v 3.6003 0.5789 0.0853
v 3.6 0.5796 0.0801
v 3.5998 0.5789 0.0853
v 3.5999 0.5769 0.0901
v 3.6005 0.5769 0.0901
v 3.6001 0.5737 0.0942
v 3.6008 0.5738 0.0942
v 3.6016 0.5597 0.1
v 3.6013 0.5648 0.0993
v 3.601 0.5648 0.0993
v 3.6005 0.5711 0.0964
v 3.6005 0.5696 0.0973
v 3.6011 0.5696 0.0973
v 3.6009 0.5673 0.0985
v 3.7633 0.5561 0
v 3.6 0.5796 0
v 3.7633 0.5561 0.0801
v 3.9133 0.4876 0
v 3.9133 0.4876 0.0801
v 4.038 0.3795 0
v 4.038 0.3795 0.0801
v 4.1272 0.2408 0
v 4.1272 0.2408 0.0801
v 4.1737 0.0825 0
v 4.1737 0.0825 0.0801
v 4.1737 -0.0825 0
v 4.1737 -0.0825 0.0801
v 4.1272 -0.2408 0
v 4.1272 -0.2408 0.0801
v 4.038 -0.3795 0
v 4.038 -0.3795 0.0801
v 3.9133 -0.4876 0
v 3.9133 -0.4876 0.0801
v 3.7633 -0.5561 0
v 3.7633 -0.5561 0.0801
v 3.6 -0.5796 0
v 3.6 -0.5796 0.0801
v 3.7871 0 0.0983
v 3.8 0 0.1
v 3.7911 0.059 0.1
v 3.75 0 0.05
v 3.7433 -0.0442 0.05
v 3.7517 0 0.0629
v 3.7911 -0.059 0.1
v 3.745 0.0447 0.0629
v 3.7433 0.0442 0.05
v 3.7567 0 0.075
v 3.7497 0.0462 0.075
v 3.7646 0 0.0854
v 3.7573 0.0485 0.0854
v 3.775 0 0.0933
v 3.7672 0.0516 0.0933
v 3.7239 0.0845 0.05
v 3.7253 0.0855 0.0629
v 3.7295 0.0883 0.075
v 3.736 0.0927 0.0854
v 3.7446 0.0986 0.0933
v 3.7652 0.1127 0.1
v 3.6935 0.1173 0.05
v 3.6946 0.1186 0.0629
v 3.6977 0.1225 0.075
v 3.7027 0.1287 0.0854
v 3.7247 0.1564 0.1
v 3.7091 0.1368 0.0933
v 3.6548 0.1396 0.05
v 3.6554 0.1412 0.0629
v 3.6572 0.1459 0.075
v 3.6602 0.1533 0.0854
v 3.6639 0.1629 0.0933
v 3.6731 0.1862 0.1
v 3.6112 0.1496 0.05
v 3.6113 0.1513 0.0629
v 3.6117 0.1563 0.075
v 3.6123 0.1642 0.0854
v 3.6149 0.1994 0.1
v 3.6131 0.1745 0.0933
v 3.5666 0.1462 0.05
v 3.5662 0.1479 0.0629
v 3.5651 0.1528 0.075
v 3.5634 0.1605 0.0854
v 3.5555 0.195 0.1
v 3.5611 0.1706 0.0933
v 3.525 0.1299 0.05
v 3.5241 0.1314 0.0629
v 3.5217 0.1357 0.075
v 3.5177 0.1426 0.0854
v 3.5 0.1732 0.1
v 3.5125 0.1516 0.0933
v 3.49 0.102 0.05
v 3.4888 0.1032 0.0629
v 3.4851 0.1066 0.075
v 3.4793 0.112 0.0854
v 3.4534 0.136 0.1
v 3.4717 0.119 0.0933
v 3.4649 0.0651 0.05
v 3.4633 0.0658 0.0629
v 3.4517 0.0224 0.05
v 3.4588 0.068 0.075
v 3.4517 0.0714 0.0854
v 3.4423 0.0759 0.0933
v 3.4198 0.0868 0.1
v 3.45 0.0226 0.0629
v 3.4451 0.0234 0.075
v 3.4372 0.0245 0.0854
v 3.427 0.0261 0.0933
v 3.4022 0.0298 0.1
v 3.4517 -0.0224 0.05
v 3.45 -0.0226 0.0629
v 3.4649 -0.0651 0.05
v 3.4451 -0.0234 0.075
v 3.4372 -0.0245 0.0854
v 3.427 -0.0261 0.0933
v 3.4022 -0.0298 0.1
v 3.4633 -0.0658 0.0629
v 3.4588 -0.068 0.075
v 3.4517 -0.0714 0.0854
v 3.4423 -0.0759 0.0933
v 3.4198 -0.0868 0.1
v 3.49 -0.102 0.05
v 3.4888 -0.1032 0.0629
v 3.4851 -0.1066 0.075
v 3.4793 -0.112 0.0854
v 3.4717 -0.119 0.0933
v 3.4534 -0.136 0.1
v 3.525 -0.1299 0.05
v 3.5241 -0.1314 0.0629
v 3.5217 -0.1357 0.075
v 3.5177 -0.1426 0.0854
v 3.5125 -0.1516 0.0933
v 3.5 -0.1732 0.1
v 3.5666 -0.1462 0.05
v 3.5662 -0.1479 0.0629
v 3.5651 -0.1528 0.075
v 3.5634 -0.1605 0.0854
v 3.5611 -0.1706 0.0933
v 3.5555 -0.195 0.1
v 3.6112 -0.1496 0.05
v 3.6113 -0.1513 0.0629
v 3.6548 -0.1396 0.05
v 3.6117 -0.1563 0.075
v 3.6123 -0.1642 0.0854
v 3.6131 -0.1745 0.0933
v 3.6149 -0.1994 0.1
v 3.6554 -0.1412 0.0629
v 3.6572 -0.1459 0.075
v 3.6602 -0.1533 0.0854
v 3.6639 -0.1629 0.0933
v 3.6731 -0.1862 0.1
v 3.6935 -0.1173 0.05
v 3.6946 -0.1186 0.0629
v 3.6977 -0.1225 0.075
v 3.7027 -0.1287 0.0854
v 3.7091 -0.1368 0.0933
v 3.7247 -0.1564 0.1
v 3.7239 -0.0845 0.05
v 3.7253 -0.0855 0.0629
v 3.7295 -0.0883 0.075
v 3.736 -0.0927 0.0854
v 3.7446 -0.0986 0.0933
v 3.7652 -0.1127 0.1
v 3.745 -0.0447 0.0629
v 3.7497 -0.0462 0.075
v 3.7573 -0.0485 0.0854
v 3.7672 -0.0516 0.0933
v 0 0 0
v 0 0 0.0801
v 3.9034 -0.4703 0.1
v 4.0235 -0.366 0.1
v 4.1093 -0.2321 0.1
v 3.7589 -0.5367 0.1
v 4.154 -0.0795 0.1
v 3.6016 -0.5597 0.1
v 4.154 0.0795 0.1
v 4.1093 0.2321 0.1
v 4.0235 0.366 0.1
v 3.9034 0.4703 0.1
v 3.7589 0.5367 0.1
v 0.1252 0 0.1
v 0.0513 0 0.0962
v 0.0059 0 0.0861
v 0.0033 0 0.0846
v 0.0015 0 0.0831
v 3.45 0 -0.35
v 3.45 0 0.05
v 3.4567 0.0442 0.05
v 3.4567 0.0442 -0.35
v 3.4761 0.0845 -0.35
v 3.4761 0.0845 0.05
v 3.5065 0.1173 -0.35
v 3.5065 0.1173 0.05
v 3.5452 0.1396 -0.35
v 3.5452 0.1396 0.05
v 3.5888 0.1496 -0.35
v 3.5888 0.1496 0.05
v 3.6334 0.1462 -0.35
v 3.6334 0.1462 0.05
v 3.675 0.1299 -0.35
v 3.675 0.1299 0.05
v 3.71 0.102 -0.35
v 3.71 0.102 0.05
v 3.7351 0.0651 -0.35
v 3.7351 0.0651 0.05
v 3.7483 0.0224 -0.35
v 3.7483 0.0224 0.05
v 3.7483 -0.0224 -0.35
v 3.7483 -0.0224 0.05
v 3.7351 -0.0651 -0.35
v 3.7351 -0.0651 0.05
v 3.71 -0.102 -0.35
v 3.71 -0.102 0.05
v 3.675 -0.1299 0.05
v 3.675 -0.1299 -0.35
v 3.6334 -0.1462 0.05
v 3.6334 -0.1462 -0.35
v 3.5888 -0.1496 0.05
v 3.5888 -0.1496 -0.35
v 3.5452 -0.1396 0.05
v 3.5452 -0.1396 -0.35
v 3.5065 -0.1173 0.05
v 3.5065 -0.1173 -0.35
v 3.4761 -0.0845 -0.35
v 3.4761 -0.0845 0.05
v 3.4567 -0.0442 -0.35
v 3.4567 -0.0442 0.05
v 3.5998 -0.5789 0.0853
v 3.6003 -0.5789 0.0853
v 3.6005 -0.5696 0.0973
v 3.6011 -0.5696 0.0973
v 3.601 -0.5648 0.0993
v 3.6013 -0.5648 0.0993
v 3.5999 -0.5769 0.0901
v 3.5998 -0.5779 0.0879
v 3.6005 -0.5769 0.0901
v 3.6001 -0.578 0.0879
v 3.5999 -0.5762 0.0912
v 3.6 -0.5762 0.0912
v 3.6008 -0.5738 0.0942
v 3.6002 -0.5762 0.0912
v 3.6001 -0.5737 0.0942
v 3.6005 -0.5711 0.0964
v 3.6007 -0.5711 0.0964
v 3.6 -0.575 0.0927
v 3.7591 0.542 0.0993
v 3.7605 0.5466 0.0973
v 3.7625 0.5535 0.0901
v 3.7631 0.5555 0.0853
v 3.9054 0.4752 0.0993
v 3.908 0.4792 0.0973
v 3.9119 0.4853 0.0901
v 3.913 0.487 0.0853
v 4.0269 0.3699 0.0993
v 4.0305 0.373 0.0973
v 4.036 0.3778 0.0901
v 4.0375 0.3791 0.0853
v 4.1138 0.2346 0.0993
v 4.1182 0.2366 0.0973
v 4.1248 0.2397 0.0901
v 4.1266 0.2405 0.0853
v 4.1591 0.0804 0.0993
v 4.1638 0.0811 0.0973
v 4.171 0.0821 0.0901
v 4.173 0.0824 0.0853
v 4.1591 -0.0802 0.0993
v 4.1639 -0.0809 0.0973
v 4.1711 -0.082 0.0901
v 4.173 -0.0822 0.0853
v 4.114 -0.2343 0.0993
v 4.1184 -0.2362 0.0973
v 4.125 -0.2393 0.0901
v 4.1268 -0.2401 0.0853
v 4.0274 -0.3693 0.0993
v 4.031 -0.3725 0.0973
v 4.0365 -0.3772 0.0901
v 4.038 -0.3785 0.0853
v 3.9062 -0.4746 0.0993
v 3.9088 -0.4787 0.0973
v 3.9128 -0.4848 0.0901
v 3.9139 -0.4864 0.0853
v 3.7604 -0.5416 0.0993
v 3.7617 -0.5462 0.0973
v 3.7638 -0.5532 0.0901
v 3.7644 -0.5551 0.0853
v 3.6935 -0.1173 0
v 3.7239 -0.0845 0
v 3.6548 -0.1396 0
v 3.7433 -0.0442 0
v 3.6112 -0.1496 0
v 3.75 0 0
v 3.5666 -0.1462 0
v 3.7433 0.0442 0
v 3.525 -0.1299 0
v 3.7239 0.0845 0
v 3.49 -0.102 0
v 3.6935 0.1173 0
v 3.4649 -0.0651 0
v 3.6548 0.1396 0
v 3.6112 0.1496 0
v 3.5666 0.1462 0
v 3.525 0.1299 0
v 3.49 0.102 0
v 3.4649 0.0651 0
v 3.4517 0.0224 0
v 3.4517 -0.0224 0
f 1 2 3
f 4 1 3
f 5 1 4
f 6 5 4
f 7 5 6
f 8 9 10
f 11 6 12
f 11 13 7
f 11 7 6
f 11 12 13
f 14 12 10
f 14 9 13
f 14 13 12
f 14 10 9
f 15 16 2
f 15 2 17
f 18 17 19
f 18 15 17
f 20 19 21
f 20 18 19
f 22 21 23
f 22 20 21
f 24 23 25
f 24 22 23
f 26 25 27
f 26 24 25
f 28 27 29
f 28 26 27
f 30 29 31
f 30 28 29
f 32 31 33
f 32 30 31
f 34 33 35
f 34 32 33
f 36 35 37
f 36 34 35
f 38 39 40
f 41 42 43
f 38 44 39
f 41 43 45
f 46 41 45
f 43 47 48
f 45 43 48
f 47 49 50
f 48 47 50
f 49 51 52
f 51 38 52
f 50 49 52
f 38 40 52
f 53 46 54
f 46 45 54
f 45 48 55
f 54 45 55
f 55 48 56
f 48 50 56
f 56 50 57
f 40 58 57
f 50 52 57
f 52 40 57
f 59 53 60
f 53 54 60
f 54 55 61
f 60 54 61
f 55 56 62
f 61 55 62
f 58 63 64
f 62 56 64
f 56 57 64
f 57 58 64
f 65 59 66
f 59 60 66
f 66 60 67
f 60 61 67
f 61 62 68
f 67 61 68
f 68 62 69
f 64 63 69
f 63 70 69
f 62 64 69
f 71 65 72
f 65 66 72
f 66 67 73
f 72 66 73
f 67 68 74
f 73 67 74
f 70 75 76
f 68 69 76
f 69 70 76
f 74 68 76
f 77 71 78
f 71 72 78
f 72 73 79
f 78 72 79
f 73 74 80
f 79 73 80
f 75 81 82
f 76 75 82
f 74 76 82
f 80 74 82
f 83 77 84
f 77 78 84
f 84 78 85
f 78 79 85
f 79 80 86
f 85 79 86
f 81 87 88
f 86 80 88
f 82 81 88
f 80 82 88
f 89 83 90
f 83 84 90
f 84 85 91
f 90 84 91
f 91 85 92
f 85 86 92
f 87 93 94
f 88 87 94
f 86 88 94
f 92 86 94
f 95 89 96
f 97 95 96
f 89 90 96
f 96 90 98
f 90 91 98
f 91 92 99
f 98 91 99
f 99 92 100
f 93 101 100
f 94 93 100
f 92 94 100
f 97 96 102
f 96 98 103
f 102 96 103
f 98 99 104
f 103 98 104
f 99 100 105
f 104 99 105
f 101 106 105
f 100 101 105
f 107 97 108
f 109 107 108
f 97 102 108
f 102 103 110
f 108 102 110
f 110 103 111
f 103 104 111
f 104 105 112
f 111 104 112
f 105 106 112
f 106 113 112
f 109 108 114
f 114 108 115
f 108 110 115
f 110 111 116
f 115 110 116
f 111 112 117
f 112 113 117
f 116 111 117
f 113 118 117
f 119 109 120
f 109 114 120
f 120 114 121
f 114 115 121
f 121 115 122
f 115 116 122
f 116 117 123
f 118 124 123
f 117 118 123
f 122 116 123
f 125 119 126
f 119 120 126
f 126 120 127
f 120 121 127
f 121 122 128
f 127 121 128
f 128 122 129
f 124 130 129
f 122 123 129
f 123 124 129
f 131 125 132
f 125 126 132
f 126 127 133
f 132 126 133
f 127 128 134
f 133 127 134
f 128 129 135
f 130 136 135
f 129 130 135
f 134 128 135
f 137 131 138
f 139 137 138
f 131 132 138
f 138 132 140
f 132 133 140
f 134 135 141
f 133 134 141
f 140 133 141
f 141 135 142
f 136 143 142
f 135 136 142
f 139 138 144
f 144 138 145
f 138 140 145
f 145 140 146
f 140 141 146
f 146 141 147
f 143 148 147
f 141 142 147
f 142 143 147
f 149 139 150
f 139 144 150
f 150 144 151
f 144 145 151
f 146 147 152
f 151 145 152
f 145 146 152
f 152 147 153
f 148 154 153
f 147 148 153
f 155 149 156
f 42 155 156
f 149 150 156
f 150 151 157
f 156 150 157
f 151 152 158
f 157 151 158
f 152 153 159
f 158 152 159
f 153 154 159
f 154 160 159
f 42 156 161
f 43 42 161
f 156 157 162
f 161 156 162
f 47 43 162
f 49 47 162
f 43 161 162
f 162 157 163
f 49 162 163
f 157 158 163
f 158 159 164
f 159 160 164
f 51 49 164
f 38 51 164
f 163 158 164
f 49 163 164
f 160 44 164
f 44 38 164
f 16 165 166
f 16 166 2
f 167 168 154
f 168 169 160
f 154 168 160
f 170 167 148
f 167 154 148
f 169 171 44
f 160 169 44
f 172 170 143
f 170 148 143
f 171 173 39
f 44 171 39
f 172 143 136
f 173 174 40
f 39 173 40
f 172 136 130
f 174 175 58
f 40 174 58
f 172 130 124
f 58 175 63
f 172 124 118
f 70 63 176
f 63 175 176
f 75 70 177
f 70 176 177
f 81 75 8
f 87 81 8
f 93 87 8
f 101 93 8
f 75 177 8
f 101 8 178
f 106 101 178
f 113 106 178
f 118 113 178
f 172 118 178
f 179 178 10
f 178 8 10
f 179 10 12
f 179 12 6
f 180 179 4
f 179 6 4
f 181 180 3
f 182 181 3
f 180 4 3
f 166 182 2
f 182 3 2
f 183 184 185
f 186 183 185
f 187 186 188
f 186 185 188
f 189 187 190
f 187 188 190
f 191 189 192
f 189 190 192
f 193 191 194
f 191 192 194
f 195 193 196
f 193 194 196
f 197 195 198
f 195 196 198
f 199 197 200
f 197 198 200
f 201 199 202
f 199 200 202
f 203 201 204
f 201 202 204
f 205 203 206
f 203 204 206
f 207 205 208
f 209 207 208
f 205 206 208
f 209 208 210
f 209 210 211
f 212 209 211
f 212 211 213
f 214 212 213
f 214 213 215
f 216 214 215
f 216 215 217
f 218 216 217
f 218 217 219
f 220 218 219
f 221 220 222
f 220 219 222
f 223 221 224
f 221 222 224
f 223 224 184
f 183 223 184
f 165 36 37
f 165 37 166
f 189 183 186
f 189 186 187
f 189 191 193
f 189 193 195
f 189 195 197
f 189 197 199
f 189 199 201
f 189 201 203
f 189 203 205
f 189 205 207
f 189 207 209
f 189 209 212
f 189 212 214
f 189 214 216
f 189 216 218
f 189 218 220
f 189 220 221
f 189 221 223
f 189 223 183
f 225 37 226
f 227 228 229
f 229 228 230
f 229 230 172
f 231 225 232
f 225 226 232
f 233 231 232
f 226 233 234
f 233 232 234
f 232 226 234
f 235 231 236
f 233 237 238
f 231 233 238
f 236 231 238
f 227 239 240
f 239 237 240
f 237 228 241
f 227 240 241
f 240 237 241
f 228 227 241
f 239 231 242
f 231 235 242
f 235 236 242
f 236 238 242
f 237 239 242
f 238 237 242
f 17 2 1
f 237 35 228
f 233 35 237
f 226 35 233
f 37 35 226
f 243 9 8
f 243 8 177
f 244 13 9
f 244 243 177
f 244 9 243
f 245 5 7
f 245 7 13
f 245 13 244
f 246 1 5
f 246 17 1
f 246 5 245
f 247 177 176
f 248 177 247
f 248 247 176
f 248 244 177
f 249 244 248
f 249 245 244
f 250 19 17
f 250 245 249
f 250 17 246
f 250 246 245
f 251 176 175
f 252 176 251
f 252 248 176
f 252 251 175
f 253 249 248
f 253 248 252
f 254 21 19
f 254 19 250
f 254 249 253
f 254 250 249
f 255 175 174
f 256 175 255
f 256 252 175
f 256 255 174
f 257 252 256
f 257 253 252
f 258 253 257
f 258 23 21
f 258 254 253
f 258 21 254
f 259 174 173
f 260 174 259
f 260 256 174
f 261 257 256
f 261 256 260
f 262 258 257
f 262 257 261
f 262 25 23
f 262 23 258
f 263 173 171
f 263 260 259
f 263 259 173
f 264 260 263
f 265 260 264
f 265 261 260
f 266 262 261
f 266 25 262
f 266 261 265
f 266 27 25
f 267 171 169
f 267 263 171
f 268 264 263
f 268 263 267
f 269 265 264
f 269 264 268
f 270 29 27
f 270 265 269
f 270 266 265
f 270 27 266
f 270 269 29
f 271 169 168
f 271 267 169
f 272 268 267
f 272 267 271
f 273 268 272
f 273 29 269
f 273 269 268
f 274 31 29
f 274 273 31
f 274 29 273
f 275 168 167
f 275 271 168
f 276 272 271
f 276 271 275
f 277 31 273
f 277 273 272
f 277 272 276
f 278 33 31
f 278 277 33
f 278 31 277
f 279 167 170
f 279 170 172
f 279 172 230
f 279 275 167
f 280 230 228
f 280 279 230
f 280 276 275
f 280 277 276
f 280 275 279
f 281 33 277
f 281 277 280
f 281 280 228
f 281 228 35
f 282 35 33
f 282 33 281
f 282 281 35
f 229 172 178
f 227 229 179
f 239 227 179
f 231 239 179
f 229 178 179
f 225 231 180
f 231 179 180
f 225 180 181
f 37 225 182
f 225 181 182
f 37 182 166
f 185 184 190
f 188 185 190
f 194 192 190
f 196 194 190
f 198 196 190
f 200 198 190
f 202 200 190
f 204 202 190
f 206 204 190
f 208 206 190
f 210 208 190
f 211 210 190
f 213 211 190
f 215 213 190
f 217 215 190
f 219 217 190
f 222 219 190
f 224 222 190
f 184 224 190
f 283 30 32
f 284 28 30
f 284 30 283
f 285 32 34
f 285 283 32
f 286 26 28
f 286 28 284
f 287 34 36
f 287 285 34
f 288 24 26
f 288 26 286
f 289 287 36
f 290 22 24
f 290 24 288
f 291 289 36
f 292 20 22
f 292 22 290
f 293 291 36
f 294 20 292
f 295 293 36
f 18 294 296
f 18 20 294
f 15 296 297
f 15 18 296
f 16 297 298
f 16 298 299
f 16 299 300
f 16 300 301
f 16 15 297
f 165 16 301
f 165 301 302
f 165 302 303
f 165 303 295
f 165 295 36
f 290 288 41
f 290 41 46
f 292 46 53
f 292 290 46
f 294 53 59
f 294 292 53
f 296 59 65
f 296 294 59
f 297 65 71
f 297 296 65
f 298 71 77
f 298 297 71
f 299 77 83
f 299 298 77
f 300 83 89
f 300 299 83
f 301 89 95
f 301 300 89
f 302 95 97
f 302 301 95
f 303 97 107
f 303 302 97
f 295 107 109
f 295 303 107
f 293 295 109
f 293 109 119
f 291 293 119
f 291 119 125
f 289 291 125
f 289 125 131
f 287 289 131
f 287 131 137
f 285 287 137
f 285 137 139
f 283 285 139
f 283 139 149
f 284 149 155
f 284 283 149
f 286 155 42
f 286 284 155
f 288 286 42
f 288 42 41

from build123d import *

# Parameters (mm, degrees)
SKETCH_1_R           = 0.15
EXTRUDE_1_DEPTH      = 0.1
EXTRUDE_2_DEPTH      = 0.35
EXTRUDE_2_DEPTH_BACK = 0.05
SKETCH_2_R           = 0.15
FILLET_1_R           = 0.05
FILLET_2_R           = 0.02


with BuildPart() as part:
    # Эскиз1 → Бобышка-Вытянуть1 (new body)
    with BuildSketch(Plane.XY):
        with BuildLine():
            Line((0, 0), (3.6, 0.579587254))
            ThreePointArc((3.6, 0.579587254), (4.179587254, 0), (3.6, -0.579587254))
            Line((3.6, -0.579587254), (0, 0))
        make_face()
        with Locations((3.6, 0)):
            Circle(SKETCH_1_R, mode=Mode.SUBTRACT)
    extrude(amount=EXTRUDE_1_DEPTH)

    # Скругление1
    fillet_1_edges = [part.edges().sort_by_distance(p)[0] for p in [
        (3.45, 0, 0.1),
    ]]
    fillet(fillet_1_edges, radius=FILLET_1_R)

    # Скругление2
    fillet_2_edges = [part.edges().sort_by_distance(p)[0] for p in [
        (4.179587254, 0, 0.1),
        (1.8, 0.289793627, 0.1),
        (1.8, -0.289793627, 0.1),
    ]]
    fillet(fillet_2_edges, radius=FILLET_2_R)


with BuildPart() as body_2:
    # Эскиз2 → Бобышка-Вытянуть2 (new, two sides: drawn at the far end of the back side and taken through both)
    with BuildSketch(Plane(origin=(0, 0, 0), x_dir=(-1, 0, 0), z_dir=(0, 0, -1)).offset(-EXTRUDE_2_DEPTH_BACK)):
        with Locations((-3.6, 0)):
            Circle(SKETCH_2_R)
    extrude(amount=EXTRUDE_2_DEPTH + EXTRUDE_2_DEPTH_BACK)


solid = Compound([part.part, body_2.part])
